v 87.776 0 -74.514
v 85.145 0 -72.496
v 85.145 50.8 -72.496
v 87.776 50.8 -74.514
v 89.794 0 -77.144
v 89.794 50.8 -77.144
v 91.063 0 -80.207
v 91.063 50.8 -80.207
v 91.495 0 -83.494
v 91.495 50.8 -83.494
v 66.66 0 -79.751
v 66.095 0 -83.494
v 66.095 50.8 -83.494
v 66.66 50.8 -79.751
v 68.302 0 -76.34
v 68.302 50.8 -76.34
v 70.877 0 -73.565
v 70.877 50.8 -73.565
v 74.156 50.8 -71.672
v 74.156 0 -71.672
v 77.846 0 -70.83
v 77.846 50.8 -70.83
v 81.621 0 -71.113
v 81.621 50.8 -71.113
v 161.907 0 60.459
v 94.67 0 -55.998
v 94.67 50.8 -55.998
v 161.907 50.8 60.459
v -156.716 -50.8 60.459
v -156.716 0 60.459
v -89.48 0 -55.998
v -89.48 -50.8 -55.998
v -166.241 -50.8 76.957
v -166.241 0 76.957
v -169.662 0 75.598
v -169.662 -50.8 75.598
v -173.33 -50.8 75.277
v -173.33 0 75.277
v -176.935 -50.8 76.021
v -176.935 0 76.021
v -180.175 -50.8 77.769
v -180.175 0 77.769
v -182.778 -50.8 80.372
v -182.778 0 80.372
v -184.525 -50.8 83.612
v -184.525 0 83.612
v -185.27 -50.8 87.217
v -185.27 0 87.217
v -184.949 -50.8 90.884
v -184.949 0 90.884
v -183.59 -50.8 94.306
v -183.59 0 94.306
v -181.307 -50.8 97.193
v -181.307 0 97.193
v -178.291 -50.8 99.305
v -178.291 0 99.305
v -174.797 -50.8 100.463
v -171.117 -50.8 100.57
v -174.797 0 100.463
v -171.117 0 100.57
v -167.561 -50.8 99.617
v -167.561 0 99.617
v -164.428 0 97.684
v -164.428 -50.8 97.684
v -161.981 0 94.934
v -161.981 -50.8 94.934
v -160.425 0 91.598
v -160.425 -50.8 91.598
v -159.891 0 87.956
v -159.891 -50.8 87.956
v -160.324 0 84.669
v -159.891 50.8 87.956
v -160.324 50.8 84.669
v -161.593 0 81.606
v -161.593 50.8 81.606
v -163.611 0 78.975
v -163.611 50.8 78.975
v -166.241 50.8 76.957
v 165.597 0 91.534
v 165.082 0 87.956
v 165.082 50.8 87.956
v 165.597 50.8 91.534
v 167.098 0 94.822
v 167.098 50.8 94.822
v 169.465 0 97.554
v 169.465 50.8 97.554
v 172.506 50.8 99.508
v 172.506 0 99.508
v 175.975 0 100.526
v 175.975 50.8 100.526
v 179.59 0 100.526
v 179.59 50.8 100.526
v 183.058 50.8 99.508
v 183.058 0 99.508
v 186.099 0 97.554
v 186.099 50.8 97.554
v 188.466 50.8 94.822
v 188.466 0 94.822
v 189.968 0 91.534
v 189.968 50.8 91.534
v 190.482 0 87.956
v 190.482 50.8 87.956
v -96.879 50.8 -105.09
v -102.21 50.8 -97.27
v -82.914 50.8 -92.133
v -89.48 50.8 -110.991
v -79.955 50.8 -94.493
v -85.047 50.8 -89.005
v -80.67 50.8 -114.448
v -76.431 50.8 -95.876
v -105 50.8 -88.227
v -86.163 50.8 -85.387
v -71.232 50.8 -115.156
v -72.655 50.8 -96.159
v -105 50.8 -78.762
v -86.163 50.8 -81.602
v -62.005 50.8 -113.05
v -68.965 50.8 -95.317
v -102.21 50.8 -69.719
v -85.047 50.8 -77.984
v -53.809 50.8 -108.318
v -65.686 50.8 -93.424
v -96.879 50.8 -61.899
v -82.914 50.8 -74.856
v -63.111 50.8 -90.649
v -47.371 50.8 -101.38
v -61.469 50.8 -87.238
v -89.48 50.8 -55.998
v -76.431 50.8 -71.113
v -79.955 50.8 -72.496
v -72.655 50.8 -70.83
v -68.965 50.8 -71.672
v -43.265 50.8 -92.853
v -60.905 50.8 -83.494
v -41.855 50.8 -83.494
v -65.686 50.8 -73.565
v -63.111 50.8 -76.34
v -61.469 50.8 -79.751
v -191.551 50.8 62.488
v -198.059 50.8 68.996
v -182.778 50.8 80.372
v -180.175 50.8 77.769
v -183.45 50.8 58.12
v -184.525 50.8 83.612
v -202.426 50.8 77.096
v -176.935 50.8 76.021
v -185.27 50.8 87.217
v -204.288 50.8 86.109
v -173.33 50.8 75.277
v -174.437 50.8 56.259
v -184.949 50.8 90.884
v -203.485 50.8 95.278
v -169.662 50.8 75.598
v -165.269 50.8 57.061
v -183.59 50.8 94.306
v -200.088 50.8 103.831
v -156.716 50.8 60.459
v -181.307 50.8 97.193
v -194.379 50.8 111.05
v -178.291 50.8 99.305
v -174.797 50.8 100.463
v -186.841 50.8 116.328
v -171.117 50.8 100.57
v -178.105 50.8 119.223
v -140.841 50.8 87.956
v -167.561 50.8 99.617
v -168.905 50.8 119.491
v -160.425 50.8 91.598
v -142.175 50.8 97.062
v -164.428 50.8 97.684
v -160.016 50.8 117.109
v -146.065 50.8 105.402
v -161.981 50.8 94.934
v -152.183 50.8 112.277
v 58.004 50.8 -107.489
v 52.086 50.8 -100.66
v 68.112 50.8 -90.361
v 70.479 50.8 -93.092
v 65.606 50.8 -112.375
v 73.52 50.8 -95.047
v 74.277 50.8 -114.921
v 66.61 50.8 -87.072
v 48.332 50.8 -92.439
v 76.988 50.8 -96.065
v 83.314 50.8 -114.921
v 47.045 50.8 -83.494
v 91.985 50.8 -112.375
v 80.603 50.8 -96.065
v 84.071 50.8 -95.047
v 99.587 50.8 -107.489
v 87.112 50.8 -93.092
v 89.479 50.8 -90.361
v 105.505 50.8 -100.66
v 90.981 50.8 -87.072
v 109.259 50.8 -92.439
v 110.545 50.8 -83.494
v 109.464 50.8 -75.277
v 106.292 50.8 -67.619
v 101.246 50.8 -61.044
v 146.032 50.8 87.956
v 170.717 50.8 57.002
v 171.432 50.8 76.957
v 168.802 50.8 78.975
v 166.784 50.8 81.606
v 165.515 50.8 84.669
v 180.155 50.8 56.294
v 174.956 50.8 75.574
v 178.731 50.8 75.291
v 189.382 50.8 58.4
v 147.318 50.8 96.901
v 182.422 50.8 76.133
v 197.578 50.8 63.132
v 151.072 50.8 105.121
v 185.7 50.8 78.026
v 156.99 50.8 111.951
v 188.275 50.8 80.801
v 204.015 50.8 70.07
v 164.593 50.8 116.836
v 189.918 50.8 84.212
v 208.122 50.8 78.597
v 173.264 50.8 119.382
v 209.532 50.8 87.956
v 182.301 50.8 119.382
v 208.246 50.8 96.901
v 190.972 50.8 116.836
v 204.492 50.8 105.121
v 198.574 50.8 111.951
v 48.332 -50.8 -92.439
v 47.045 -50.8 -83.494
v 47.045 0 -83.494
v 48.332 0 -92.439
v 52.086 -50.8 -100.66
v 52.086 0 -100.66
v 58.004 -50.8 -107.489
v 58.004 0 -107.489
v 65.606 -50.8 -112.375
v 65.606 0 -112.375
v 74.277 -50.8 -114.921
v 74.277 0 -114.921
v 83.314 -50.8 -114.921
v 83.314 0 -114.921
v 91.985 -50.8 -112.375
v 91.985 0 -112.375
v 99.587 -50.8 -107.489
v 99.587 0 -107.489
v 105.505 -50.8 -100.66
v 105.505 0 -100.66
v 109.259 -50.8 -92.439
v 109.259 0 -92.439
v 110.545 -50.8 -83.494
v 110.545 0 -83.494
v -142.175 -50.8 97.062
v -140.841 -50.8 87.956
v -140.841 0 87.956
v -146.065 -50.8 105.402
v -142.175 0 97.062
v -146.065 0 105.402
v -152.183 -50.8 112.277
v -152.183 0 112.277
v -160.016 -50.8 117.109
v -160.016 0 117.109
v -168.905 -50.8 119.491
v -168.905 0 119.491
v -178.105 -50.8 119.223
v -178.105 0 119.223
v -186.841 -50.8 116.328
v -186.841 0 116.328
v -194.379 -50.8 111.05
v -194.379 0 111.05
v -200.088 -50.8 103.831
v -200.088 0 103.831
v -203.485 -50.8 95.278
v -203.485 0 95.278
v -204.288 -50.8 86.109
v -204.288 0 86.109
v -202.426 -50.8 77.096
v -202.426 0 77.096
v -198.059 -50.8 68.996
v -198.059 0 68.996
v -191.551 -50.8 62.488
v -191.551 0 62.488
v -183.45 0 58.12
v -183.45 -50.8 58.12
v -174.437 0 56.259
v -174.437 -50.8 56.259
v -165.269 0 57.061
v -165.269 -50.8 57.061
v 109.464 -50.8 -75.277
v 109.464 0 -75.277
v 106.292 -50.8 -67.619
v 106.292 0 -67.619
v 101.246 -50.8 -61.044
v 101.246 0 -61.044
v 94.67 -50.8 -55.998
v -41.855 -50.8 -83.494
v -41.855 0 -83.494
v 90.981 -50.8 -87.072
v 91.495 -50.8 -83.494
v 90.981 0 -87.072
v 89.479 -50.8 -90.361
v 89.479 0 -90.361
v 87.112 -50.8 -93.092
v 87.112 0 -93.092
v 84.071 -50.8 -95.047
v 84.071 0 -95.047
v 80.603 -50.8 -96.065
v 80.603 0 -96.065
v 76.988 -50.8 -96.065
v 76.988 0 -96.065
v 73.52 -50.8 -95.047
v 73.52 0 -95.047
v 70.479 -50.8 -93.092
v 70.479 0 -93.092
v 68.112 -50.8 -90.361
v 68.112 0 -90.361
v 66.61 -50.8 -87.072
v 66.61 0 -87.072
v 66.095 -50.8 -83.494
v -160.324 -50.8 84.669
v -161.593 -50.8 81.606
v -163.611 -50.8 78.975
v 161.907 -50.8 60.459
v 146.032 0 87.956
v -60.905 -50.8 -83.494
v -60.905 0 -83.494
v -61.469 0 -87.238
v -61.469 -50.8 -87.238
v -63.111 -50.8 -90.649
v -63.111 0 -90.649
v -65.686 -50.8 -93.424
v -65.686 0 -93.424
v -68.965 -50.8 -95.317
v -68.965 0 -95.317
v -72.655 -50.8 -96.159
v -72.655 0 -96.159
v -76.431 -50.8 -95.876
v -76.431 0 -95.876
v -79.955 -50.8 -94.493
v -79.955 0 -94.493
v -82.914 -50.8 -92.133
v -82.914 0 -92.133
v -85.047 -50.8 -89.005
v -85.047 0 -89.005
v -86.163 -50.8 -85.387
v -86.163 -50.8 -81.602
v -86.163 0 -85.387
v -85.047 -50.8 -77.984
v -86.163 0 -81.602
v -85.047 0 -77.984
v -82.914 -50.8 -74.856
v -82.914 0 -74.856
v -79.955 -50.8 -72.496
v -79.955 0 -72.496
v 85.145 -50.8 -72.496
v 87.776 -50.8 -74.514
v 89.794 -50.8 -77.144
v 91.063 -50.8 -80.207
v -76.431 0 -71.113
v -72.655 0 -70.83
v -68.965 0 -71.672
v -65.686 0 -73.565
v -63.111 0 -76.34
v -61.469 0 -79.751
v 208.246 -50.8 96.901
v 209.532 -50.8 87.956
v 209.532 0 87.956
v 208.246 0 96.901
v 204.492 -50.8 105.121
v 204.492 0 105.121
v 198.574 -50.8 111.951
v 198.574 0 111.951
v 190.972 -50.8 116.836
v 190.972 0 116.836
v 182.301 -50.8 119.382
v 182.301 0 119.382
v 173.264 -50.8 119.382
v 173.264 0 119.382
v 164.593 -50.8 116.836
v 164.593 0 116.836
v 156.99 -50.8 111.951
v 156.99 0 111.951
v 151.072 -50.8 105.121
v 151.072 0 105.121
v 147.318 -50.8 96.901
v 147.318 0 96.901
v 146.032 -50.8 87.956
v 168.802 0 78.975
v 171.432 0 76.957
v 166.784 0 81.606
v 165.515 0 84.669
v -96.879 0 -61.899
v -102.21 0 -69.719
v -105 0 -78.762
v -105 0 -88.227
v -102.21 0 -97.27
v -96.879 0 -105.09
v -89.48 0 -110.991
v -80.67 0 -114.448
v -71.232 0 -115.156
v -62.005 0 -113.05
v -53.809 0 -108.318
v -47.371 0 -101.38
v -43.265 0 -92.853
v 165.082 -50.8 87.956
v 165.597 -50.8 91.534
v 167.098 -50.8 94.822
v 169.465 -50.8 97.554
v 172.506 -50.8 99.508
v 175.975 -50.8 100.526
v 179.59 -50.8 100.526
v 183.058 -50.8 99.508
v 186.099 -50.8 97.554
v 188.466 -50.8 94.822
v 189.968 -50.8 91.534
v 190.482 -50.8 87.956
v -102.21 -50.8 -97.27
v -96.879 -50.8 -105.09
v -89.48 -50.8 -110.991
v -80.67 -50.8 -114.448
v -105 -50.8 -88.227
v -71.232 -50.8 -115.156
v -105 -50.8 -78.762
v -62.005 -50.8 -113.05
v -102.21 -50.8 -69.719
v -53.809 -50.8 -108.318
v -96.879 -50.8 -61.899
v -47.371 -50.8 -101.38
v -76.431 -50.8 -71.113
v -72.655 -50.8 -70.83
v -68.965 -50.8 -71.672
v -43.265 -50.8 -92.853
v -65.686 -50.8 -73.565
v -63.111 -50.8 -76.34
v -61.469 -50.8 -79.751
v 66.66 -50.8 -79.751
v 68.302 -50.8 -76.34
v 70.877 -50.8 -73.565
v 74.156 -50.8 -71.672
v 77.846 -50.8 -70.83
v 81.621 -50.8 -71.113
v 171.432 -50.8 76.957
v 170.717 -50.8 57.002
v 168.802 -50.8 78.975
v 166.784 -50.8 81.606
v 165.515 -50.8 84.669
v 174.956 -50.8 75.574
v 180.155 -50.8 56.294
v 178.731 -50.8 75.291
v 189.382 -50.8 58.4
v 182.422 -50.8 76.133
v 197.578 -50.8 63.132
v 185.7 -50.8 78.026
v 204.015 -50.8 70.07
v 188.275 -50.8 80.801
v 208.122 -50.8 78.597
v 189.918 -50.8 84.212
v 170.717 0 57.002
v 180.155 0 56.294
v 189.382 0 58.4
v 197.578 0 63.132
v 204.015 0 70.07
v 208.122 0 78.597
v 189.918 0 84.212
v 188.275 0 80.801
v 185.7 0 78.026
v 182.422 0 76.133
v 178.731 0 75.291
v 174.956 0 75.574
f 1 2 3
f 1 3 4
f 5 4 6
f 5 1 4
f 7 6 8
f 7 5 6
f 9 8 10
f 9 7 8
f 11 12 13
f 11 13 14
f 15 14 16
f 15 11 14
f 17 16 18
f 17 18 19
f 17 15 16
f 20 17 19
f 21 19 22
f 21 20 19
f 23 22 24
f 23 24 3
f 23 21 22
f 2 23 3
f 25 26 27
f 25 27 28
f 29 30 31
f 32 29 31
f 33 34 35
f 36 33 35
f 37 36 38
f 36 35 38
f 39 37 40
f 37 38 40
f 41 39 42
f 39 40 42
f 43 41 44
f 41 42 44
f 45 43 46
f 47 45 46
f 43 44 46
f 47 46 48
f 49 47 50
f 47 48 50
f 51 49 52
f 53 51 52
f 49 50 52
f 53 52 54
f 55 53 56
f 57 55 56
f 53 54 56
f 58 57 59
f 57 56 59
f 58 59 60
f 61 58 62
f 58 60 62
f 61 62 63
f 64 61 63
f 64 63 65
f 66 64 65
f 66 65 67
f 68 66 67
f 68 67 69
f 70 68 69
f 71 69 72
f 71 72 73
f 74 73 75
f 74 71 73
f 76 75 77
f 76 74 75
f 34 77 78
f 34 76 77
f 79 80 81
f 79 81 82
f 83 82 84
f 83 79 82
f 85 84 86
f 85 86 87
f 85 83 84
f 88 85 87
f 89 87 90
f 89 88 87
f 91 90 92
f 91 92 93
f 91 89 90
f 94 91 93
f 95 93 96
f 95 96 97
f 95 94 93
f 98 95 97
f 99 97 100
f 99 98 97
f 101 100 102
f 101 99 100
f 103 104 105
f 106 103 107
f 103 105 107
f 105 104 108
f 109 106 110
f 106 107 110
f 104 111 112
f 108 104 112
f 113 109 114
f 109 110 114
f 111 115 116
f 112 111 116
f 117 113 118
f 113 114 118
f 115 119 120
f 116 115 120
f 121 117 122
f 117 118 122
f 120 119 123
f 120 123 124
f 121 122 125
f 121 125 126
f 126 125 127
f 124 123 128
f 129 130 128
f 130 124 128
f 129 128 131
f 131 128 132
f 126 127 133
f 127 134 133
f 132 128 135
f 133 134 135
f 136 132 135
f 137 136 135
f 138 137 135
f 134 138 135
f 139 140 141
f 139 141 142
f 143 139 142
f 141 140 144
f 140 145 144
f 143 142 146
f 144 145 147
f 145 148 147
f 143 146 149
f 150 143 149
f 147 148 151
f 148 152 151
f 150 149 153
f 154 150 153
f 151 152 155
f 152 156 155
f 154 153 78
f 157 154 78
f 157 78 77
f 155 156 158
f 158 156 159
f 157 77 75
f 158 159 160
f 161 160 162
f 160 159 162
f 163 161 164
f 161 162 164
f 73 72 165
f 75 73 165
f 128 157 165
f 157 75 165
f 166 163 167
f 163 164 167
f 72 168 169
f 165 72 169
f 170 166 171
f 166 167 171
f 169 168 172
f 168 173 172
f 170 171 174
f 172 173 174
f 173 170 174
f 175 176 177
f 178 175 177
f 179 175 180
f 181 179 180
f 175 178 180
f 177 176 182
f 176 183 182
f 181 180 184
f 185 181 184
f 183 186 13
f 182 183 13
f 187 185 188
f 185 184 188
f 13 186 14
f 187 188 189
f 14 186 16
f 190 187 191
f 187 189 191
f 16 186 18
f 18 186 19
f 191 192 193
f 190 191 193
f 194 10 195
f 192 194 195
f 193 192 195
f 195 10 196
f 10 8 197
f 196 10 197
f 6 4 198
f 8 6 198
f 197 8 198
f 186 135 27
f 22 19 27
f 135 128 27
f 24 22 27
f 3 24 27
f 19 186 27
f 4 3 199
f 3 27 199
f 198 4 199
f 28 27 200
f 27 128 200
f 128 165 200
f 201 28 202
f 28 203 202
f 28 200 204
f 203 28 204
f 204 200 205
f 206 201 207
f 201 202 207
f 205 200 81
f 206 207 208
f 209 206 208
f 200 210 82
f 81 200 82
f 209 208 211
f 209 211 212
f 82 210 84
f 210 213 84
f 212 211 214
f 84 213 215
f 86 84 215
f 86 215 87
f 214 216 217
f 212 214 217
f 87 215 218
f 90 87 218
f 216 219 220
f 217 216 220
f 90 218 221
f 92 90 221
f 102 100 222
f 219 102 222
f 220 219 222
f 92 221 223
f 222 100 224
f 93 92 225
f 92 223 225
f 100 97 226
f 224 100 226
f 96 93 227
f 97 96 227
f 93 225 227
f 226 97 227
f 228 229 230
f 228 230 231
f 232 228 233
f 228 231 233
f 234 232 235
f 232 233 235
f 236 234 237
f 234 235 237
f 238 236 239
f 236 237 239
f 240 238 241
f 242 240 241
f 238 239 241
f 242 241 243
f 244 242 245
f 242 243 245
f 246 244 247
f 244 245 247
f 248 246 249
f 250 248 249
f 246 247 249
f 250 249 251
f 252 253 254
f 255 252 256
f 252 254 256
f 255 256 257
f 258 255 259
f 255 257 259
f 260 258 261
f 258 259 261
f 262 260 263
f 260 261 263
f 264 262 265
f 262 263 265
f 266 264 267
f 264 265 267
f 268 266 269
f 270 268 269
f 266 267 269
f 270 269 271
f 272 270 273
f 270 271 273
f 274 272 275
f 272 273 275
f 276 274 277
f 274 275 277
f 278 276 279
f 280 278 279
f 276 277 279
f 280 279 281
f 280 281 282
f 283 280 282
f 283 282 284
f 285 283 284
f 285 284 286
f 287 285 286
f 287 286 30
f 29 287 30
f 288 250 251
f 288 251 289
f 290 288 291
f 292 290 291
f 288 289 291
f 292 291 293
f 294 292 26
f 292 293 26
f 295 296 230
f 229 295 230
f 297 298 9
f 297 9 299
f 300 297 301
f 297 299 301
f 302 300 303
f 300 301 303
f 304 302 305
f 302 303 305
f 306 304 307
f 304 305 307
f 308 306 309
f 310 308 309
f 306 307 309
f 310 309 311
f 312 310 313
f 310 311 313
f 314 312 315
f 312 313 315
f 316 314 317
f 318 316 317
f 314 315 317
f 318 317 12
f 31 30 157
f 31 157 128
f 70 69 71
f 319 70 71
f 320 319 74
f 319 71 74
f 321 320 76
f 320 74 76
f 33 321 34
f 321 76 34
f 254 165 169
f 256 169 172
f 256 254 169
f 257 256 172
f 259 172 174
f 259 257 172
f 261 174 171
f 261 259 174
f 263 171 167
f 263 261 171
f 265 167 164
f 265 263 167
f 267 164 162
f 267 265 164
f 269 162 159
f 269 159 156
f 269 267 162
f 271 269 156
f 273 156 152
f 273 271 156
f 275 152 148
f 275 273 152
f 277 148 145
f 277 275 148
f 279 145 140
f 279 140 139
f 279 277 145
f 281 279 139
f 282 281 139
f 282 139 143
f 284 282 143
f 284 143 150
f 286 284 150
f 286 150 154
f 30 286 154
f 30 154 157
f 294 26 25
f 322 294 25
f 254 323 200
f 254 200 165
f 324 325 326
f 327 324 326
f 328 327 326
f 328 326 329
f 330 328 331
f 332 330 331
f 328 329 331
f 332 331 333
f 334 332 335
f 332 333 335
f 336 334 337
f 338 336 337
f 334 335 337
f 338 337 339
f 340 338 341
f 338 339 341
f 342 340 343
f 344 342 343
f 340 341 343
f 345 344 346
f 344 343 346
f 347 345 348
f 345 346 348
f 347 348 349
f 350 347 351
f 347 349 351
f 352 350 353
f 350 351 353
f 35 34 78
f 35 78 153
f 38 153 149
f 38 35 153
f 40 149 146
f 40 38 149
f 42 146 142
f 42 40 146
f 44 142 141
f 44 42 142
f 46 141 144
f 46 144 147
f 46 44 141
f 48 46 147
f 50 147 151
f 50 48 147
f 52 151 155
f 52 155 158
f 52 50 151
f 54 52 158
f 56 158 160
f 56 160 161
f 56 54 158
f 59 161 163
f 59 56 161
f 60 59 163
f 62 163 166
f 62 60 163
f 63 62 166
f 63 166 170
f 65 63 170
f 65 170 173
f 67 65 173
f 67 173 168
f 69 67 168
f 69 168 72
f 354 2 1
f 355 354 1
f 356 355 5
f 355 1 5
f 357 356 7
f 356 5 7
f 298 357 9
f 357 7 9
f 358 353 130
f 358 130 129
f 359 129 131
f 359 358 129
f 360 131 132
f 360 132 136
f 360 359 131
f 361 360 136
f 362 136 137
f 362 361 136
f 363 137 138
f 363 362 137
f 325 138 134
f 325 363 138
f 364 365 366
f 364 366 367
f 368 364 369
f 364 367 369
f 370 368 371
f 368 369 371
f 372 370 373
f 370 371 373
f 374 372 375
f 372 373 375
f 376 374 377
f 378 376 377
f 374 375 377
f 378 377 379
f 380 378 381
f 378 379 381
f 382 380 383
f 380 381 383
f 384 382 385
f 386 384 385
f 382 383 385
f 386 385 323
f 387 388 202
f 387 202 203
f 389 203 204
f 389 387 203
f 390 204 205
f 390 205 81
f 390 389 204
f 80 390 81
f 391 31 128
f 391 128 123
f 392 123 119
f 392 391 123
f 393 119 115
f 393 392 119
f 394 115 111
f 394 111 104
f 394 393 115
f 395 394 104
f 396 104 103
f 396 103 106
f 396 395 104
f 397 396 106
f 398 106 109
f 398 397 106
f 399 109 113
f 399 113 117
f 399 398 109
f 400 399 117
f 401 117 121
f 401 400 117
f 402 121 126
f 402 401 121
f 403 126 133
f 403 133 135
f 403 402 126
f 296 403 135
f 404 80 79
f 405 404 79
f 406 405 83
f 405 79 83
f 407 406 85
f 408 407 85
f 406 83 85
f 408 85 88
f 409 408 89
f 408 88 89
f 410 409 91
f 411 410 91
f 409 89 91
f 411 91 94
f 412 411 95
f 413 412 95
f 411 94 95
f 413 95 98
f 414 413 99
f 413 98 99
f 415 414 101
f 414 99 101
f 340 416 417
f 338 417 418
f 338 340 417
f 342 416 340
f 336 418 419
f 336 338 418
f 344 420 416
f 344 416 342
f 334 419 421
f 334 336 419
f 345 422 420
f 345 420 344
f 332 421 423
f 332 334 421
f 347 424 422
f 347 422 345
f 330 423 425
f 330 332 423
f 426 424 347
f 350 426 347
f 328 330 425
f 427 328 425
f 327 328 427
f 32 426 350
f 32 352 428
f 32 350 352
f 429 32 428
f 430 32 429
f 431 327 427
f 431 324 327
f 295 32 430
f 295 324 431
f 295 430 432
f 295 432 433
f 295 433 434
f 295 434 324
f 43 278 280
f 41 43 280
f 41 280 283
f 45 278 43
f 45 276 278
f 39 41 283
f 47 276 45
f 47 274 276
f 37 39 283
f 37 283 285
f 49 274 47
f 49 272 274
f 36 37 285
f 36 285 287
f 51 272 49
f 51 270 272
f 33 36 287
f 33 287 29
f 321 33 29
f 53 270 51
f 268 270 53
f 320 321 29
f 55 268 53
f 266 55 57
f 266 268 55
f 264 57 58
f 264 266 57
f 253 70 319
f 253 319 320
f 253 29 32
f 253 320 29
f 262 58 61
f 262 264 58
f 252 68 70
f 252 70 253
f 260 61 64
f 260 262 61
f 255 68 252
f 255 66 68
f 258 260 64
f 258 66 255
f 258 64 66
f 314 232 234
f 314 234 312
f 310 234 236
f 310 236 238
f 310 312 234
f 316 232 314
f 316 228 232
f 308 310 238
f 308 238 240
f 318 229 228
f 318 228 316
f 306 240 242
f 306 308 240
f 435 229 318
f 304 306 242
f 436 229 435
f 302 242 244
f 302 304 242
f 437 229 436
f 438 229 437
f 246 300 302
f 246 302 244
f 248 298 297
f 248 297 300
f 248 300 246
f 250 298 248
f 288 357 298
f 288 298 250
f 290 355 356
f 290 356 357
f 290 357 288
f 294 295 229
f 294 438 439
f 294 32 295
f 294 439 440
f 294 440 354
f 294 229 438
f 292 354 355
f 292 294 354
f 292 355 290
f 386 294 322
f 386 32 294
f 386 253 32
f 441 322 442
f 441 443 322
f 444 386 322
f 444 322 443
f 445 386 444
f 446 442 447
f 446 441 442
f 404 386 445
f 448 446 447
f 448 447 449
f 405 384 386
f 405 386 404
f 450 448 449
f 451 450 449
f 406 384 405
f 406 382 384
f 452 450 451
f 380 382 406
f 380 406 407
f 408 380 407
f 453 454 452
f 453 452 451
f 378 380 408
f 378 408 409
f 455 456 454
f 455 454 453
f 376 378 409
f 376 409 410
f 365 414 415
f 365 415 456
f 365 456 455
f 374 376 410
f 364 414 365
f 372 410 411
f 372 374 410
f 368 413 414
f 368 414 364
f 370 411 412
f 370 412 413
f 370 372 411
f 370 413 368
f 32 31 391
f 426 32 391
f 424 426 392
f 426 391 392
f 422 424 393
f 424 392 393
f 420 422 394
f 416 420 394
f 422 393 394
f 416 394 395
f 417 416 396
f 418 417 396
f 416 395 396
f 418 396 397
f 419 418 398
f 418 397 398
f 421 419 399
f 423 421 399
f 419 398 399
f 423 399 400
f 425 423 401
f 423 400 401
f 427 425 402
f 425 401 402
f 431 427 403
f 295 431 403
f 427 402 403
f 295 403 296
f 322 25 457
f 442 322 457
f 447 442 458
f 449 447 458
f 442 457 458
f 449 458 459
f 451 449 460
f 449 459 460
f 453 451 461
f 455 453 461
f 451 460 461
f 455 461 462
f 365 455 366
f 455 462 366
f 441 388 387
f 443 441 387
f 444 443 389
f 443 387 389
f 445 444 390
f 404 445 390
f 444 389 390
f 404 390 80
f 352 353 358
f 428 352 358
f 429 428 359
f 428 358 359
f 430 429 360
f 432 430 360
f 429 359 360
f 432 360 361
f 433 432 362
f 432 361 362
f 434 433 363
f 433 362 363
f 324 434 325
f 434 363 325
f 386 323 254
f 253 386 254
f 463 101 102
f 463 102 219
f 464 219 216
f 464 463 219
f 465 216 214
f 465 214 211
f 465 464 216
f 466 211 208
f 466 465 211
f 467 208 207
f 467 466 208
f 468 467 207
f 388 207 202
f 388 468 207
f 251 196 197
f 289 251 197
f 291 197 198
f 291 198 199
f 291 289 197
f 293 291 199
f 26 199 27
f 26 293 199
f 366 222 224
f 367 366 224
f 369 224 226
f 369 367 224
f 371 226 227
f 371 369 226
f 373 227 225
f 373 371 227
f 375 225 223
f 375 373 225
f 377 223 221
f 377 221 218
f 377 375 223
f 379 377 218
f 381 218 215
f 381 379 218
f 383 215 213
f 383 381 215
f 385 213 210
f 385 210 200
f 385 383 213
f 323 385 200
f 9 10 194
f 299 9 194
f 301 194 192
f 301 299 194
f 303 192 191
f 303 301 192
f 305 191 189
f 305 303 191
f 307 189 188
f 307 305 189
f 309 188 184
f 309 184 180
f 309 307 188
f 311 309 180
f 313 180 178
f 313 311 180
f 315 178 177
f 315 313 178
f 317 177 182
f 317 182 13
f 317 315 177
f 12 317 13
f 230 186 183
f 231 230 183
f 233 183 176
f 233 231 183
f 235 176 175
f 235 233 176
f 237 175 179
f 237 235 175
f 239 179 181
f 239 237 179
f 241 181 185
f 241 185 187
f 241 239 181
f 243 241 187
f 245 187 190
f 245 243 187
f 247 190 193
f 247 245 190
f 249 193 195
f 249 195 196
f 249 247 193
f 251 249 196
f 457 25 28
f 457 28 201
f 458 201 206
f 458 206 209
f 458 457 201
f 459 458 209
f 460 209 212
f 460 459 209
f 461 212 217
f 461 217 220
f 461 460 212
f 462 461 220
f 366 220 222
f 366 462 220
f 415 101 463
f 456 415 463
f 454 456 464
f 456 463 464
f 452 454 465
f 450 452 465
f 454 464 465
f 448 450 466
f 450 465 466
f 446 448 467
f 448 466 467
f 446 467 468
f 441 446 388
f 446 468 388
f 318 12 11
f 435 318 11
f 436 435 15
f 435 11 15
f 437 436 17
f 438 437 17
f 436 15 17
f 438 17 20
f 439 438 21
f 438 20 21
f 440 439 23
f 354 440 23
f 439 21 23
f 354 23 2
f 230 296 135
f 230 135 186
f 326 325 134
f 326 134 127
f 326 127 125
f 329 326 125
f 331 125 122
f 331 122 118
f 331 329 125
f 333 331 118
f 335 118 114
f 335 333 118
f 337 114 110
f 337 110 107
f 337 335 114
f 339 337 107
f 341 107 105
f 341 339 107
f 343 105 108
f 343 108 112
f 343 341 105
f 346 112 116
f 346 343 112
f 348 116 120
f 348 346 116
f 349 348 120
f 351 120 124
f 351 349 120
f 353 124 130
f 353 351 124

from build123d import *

# Parameters (mm, degrees)
F1_DEPTH = 50.8


with BuildPart() as f1:
    # F0 (on Front) → F1 (new body, symmetric)
    with BuildSketch(Plane.XZ):
        with BuildLine():
            ThreePointArc((-79.9545346996, -72.4959198801), (-67.2545346996, -72.4959198801), (-60.9045346996, -83.4944425082))
            Line((-60.9045346996, -83.4944425082), (-41.8545346996, -83.4944425082))
            ThreePointArc((-41.8545346996, -83.4944425082), (-57.7295346996, -55.998135938), (-89.4795346996, -55.998135938))
            Line((-89.4795346996, -55.998135938), (-79.9545346996, -72.4959198801))
        make_face()
        with BuildLine():
            Line((-41.8545346996, -83.4944425082), (-60.9045346996, -83.4944425082))
            ThreePointArc((-60.9045346996, -83.4944425082), (-79.9545346996, -94.4929651363), (-79.9545346996, -72.4959198801))
            Line((-79.9545346996, -72.4959198801), (-89.4795346996, -55.998135938))
            ThreePointArc((-89.4795346996, -55.998135938), (-89.4795346996, -110.9907490783), (-41.8545346996, -83.4944425082))
        make_face()
        with BuildLine():
            ThreePointArc((-89.4795346996, -55.998135938), (-57.7295346996, -55.998135938), (-41.8545346996, -83.4944425082))
            Line((-41.8545346996, -83.4944425082), (47.0454653004, -83.4944425082))
            ThreePointArc((47.0454653004, -83.4944425082), (62.9204653004, -55.998135938), (94.6704653004, -55.998135938))
            Line((94.6704653004, -55.998135938), (161.9071689529, 60.4592509217))
            ThreePointArc((161.9071689529, 60.4592509217), (150.2858623828, 72.0805574918), (146.0321689529, 87.9555574918))
            Line((146.0321689529, 87.9555574918), (-140.8412383522, 87.9555574918))
            ThreePointArc((-140.8412383522, 87.9555574918), (-145.094931782, 72.0805574918), (-156.7162383522, 60.4592509217))
            Line((-156.7162383522, 60.4592509217), (-89.4795346996, -55.998135938))
        make_face()
        with BuildLine():
            ThreePointArc((94.6704653004, -55.998135938), (62.9204653004, -55.998135938), (47.0454653004, -83.4944425082))
            Line((47.0454653004, -83.4944425082), (66.0954653004, -83.4944425082))
            ThreePointArc((66.0954653004, -83.4944425082), (72.4454653004, -72.4959198801), (85.1454653004, -72.4959198801))
            Line((85.1454653004, -72.4959198801), (94.6704653004, -55.998135938))
        make_face()
        with BuildLine():
            Line((66.0954653004, -83.4944425082), (47.0454653004, -83.4944425082))
            ThreePointArc((47.0454653004, -83.4944425082), (78.7954653004, -115.2444425082), (110.5454653004, -83.4944425082))
            ThreePointArc((110.5454653004, -83.4944425082), (106.2917718705, -67.6194425082), (94.6704653004, -55.998135938))
            Line((94.6704653004, -55.998135938), (85.1454653004, -72.4959198801))
            ThreePointArc((85.1454653004, -72.4959198801), (89.7939879284, -77.1444425082), (91.4954653004, -83.4944425082))
            ThreePointArc((91.4954653004, -83.4944425082), (78.7954653004, -96.1944425082), (66.0954653004, -83.4944425082))
        make_face()
        with BuildLine():
            ThreePointArc((-140.8412383522, 87.9555574918), (-200.0875449223, 103.8305574918), (-156.7162383522, 60.4592509217))
            Line((-156.7162383522, 60.4592509217), (-166.2412383522, 76.9570348637))
            ThreePointArc((-166.2412383522, 76.9570348637), (-183.5897609803, 94.3055574918), (-159.8912383522, 87.9555574918))
            Line((-159.8912383522, 87.9555574918), (-140.8412383522, 87.9555574918))
        make_face()
        with BuildLine():
            Line((-166.2412383522, 76.9570348637), (-156.7162383522, 60.4592509217))
            ThreePointArc((-156.7162383522, 60.4592509217), (-145.094931782, 72.0805574918), (-140.8412383522, 87.9555574918))
            Line((-140.8412383522, 87.9555574918), (-159.8912383522, 87.9555574918))
            ThreePointArc((-159.8912383522, 87.9555574918), (-161.5927157241, 81.6055574918), (-166.2412383522, 76.9570348637))
        make_face()
        with BuildLine():
            ThreePointArc((146.0321689529, 87.9555574918), (150.2858623828, 72.0805574918), (161.9071689529, 60.4592509217))
            Line((161.9071689529, 60.4592509217), (171.4321689529, 76.9570348637))
            ThreePointArc((171.4321689529, 76.9570348637), (166.7836463249, 81.6055574918), (165.0821689529, 87.9555574918))
            Line((165.0821689529, 87.9555574918), (146.0321689529, 87.9555574918))
        make_face()
        with BuildLine():
            Line((171.4321689529, 76.9570348637), (161.9071689529, 60.4592509217))
            ThreePointArc((161.9071689529, 60.4592509217), (193.6571689529, 60.4592509217), (209.5321689529, 87.9555574918))
            ThreePointArc((209.5321689529, 87.9555574918), (177.7821689529, 119.7055574918), (146.0321689529, 87.9555574918))
            Line((146.0321689529, 87.9555574918), (165.0821689529, 87.9555574918))
            ThreePointArc((165.0821689529, 87.9555574918), (177.7821689529, 100.6555574918), (190.4821689529, 87.9555574918))
            ThreePointArc((190.4821689529, 87.9555574918), (184.1321689529, 76.9570348637), (171.4321689529, 76.9570348637))
        make_face()
    extrude(amount=F1_DEPTH, both=True)


solid = f1.part
